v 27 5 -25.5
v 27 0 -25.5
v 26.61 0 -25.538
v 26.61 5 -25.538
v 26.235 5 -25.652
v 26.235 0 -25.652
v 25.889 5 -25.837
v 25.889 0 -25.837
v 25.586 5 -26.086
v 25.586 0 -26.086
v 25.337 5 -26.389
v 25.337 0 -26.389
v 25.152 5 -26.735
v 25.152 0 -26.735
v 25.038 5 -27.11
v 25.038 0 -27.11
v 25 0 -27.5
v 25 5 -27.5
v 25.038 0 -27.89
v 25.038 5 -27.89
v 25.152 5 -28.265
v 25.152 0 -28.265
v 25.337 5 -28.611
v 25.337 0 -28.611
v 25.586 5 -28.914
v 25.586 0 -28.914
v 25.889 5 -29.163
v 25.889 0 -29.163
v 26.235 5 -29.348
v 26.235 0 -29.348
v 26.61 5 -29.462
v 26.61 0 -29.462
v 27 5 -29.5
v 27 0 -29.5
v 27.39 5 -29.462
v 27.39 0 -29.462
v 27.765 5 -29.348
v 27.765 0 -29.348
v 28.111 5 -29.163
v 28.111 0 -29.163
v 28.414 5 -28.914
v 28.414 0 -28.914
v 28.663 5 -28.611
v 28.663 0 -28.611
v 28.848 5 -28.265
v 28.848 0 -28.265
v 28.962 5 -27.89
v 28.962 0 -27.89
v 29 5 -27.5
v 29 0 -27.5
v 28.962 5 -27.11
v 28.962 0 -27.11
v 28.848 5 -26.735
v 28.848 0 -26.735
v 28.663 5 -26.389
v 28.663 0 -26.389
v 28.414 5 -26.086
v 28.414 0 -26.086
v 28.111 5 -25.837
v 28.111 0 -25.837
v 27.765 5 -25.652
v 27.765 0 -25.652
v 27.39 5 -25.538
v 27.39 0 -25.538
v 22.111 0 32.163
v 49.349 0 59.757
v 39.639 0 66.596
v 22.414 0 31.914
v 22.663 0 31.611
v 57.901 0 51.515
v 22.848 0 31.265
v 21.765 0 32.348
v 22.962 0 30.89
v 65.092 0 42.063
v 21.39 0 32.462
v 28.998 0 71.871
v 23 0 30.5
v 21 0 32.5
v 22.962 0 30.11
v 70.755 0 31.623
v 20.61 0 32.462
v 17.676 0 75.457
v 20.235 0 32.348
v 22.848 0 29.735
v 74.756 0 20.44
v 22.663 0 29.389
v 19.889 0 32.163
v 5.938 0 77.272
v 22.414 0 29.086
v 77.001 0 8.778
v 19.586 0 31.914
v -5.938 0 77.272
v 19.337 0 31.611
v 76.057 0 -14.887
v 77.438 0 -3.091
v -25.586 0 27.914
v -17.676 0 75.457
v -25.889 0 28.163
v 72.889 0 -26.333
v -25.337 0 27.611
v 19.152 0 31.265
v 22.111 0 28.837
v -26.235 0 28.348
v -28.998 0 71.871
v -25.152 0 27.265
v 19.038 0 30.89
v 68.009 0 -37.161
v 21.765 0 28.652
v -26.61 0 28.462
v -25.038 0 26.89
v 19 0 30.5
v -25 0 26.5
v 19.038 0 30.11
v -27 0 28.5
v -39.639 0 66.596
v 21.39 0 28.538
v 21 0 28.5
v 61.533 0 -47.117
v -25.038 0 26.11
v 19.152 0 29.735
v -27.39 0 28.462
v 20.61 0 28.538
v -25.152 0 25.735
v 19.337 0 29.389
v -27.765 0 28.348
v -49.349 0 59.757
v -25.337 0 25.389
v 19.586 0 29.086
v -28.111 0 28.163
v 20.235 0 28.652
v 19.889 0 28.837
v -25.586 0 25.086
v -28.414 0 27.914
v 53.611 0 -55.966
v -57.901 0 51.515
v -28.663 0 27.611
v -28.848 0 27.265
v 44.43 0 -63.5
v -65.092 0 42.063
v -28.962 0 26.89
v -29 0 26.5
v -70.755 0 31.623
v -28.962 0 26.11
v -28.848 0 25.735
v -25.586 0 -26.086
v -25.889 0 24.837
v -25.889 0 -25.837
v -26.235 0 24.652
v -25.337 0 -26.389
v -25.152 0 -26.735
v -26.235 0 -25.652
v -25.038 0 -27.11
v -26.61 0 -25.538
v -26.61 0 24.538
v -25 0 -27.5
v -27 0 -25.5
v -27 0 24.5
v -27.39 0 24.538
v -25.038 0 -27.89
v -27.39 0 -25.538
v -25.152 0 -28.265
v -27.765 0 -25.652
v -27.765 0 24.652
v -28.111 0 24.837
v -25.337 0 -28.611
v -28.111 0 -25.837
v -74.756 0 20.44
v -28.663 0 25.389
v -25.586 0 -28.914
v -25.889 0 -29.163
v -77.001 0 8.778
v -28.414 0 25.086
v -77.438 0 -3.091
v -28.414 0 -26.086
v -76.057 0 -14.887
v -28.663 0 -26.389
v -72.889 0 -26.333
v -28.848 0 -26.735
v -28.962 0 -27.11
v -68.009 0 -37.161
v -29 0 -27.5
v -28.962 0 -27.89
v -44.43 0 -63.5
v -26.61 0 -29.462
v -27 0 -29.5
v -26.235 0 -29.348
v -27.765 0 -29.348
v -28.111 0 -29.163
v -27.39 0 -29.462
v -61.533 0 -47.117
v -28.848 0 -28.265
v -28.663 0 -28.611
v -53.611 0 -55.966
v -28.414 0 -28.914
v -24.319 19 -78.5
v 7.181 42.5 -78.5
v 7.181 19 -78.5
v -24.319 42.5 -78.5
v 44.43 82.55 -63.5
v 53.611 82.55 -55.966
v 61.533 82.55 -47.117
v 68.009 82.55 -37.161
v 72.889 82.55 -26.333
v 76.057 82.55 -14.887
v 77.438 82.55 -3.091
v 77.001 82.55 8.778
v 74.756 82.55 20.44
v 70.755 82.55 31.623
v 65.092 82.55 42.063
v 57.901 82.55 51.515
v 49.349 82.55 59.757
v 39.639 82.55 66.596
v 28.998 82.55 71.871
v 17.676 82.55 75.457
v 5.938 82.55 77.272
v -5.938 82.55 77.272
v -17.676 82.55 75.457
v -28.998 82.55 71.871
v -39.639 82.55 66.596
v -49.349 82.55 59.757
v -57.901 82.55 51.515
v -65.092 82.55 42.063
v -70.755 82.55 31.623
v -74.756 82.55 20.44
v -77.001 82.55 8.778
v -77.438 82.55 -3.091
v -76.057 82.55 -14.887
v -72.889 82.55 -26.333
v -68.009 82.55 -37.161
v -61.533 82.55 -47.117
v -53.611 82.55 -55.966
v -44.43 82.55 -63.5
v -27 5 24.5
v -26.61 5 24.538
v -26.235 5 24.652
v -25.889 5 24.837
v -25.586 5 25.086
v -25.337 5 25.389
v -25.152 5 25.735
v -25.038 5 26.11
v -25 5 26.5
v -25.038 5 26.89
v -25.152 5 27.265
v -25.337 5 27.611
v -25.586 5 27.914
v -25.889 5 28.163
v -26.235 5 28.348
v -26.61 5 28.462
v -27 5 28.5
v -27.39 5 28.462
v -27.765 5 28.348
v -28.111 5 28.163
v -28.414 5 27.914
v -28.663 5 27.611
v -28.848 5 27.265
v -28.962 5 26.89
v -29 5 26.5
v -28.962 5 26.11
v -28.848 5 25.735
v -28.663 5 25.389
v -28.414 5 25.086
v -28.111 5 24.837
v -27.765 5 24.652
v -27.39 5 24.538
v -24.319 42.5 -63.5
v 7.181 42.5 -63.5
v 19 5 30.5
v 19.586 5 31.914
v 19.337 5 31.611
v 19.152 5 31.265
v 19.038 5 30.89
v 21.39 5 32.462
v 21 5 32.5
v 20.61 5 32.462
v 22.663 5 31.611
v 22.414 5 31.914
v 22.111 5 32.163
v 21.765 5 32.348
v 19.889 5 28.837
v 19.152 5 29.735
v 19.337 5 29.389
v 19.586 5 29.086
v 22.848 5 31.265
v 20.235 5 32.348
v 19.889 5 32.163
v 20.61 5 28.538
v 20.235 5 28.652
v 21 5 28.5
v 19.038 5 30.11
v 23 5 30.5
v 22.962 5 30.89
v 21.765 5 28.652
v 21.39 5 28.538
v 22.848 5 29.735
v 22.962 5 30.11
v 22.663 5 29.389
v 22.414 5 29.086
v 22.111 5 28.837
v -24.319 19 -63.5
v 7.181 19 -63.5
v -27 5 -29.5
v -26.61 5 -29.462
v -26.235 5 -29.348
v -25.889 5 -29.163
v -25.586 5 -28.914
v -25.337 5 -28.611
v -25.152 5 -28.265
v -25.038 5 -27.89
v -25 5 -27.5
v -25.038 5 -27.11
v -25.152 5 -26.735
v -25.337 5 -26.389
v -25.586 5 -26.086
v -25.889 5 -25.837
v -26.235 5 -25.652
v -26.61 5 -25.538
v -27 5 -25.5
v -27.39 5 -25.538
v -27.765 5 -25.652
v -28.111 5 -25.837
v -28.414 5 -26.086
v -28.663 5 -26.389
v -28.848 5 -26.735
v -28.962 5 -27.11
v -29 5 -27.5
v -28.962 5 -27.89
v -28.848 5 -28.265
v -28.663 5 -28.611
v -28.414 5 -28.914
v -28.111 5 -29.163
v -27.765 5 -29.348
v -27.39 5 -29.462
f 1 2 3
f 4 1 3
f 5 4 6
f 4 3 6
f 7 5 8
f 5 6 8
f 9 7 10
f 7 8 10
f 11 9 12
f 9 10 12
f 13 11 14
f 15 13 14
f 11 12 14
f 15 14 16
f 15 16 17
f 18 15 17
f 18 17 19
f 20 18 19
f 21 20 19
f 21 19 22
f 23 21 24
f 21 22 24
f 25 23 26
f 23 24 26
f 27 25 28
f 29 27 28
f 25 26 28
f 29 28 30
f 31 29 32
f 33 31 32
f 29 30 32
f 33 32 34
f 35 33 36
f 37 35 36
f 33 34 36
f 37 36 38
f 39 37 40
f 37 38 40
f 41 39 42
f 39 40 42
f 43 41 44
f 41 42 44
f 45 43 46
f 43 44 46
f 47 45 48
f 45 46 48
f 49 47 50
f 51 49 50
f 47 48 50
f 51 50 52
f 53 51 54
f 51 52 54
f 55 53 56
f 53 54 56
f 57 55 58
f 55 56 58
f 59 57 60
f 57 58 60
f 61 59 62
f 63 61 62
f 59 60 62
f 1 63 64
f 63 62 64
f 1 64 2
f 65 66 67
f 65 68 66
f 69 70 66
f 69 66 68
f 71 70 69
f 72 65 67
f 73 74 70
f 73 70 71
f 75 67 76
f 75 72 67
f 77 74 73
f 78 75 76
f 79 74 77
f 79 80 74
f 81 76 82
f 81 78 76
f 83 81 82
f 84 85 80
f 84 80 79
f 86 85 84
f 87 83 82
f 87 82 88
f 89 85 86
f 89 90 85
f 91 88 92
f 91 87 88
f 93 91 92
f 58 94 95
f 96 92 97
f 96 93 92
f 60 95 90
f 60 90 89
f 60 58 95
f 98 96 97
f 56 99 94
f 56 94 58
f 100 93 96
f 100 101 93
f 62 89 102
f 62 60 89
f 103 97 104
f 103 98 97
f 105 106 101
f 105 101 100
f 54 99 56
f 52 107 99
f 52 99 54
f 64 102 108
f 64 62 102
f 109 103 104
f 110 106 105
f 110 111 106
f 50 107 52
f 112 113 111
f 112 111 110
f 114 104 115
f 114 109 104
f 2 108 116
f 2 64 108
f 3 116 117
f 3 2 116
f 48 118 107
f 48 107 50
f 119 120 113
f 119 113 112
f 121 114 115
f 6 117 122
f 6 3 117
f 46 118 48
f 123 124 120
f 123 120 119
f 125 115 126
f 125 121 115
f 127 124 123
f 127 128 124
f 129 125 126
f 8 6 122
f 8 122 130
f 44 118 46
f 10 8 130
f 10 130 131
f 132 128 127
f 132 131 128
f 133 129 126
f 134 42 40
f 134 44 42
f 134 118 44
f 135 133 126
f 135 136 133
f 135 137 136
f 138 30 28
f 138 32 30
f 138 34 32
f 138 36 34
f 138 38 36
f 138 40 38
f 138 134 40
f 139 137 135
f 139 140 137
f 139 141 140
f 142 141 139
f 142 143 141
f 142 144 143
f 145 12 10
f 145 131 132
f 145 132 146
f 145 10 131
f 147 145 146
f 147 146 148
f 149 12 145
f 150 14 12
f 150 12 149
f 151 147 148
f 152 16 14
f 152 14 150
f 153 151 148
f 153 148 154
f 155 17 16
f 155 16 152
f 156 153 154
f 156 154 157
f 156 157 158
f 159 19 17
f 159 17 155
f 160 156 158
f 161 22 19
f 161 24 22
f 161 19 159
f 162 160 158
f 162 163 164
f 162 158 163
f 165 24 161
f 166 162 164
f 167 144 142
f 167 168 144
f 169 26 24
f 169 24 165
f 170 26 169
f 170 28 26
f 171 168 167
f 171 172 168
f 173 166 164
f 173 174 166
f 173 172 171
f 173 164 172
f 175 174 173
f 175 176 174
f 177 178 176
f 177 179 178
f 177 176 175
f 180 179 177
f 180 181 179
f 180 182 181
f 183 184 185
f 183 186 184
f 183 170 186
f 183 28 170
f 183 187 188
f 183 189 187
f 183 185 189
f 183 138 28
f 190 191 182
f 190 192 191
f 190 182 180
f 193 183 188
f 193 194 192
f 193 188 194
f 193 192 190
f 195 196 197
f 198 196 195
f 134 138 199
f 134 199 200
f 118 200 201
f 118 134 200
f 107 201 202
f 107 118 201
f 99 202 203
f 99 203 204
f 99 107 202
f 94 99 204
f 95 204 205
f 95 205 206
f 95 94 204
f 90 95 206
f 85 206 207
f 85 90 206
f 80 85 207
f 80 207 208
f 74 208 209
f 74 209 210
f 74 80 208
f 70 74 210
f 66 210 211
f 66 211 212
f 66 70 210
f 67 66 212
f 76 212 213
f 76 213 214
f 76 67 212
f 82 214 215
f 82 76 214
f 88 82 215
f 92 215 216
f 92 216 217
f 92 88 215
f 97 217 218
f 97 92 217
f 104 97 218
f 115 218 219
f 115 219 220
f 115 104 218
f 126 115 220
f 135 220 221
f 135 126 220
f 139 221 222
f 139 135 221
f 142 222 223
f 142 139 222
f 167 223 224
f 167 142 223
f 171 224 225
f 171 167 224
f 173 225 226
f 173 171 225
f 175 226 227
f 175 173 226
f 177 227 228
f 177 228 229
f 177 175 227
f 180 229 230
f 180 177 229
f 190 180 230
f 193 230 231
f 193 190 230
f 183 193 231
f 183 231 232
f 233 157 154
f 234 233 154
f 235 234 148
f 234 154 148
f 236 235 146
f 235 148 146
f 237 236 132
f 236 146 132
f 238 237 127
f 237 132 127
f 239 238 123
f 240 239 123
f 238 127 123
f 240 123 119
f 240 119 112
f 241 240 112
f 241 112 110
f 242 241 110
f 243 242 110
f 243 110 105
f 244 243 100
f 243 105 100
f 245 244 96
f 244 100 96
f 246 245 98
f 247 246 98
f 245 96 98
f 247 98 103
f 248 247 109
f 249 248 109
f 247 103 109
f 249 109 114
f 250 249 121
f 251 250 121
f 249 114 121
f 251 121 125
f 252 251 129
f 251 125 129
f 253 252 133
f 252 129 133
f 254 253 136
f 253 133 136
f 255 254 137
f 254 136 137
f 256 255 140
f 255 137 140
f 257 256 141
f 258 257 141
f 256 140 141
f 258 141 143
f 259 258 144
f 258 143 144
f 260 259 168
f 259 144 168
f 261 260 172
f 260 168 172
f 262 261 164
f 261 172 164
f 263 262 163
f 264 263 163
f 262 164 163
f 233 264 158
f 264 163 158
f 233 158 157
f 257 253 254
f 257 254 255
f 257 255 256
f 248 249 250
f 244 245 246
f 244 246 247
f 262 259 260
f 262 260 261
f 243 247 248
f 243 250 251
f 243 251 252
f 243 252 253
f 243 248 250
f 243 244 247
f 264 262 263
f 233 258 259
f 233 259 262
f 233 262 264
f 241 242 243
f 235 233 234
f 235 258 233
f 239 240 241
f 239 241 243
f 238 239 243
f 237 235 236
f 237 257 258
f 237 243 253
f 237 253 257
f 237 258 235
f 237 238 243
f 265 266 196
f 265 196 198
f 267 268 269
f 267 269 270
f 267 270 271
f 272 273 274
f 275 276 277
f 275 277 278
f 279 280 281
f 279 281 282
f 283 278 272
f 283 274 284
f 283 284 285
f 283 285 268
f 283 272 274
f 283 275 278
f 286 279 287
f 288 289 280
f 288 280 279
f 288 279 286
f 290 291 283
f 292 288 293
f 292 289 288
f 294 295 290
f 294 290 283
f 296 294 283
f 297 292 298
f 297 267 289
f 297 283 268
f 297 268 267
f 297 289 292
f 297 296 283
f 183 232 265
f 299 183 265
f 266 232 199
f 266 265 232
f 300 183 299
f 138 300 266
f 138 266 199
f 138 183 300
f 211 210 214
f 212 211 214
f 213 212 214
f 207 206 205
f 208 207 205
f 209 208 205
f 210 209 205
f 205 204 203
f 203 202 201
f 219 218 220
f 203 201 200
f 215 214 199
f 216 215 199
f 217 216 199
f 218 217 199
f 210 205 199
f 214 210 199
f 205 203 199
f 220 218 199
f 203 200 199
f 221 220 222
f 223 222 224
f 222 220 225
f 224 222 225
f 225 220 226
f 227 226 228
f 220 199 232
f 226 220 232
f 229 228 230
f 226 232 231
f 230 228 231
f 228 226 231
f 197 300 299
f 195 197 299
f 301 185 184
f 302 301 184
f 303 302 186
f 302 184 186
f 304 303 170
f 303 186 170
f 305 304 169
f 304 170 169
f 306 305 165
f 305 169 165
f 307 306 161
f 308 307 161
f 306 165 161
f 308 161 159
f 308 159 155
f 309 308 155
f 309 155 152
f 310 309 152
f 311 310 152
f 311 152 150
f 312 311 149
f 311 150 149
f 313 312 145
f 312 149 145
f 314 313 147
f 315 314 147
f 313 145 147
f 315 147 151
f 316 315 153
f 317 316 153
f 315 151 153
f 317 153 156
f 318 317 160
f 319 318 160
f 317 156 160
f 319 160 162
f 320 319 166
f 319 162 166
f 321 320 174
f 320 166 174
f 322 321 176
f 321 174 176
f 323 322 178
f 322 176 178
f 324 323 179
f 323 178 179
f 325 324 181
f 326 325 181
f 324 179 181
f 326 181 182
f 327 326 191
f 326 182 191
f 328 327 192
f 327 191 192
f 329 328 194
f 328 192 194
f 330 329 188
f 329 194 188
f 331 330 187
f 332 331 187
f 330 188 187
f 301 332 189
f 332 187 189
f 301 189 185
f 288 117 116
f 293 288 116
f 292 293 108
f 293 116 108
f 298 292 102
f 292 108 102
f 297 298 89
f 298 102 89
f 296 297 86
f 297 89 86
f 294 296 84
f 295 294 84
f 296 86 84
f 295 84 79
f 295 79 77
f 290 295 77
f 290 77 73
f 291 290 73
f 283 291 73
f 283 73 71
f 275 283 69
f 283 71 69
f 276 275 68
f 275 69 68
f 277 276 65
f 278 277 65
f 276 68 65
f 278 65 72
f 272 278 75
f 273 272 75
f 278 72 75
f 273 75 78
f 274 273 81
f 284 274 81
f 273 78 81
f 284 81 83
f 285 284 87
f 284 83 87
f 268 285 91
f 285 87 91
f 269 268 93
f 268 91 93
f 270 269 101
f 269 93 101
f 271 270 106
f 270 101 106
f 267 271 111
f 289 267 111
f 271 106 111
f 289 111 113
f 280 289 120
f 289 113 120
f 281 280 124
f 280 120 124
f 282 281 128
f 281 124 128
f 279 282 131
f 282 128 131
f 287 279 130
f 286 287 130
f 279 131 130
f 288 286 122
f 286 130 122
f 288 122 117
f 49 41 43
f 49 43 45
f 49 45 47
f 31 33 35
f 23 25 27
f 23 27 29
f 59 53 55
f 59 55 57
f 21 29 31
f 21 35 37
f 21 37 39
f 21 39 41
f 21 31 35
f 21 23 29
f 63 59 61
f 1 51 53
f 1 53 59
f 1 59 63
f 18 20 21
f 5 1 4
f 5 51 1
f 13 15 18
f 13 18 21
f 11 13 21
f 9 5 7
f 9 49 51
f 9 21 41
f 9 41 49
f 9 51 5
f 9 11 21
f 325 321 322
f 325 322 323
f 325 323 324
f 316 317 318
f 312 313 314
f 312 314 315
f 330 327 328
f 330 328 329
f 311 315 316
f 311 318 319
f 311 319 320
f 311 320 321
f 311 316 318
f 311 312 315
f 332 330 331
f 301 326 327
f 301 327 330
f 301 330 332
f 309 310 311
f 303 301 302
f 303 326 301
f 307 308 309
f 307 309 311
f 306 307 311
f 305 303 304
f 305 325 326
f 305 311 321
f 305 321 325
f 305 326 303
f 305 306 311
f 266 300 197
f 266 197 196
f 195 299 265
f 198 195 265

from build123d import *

# Parameters (mm, degrees)
BOSS_EXTRUDE1_DEPTH = 82.55
SKETCH2_R           = 2
CUT_EXTRUDE1_DEPTH  = 5
SKETCH3_W           = 31.5
SKETCH3_H           = 23.5
BOSS_EXTRUDE2_DEPTH = 15


with BuildPart() as part:
    # Sketch1 → Boss-Extrude1 (new body)
    with BuildSketch(Plane(origin=(0, 0, 0), x_dir=(1, 0, 0), z_dir=(0, 1, 0))):
        with BuildLine():
            Line((-44.429719783, 63.5), (44.429719783, 63.5))
            ThreePointArc((44.429719783, 63.5), (0, -77.5), (-44.429719783, 63.5))
        make_face()
    extrude(amount=BOSS_EXTRUDE1_DEPTH)

    # Sketch2 → Cut-Extrude1 (cut)
    with BuildSketch(Plane.XZ):
        with Locations(Location((-27, -27.5, 0), (0, 0, 270))):
            Circle(SKETCH2_R)
        with Locations(Location((-27, 26.5, 0), (0, 0, 270))):
            Circle(SKETCH2_R)
        with Locations(Location((21, 30.5, 0), (0, 0, 270))):
            Circle(SKETCH2_R)
        with Locations(Location((27, -27.5, 0), (0, 0, 90))):
            Circle(SKETCH2_R)
    extrude(amount=-CUT_EXTRUDE1_DEPTH, mode=Mode.SUBTRACT)

    # Sketch3 → Boss-Extrude2 (add)
    with BuildSketch(Plane(origin=(0, 0, -63.5), x_dir=(-1, 0, 0), z_dir=(0, 0, -1))):
        with Locations((8.56875, 30.75)):
            Rectangle(SKETCH3_W, SKETCH3_H)
    extrude(amount=BOSS_EXTRUDE2_DEPTH)


solid = part.part
